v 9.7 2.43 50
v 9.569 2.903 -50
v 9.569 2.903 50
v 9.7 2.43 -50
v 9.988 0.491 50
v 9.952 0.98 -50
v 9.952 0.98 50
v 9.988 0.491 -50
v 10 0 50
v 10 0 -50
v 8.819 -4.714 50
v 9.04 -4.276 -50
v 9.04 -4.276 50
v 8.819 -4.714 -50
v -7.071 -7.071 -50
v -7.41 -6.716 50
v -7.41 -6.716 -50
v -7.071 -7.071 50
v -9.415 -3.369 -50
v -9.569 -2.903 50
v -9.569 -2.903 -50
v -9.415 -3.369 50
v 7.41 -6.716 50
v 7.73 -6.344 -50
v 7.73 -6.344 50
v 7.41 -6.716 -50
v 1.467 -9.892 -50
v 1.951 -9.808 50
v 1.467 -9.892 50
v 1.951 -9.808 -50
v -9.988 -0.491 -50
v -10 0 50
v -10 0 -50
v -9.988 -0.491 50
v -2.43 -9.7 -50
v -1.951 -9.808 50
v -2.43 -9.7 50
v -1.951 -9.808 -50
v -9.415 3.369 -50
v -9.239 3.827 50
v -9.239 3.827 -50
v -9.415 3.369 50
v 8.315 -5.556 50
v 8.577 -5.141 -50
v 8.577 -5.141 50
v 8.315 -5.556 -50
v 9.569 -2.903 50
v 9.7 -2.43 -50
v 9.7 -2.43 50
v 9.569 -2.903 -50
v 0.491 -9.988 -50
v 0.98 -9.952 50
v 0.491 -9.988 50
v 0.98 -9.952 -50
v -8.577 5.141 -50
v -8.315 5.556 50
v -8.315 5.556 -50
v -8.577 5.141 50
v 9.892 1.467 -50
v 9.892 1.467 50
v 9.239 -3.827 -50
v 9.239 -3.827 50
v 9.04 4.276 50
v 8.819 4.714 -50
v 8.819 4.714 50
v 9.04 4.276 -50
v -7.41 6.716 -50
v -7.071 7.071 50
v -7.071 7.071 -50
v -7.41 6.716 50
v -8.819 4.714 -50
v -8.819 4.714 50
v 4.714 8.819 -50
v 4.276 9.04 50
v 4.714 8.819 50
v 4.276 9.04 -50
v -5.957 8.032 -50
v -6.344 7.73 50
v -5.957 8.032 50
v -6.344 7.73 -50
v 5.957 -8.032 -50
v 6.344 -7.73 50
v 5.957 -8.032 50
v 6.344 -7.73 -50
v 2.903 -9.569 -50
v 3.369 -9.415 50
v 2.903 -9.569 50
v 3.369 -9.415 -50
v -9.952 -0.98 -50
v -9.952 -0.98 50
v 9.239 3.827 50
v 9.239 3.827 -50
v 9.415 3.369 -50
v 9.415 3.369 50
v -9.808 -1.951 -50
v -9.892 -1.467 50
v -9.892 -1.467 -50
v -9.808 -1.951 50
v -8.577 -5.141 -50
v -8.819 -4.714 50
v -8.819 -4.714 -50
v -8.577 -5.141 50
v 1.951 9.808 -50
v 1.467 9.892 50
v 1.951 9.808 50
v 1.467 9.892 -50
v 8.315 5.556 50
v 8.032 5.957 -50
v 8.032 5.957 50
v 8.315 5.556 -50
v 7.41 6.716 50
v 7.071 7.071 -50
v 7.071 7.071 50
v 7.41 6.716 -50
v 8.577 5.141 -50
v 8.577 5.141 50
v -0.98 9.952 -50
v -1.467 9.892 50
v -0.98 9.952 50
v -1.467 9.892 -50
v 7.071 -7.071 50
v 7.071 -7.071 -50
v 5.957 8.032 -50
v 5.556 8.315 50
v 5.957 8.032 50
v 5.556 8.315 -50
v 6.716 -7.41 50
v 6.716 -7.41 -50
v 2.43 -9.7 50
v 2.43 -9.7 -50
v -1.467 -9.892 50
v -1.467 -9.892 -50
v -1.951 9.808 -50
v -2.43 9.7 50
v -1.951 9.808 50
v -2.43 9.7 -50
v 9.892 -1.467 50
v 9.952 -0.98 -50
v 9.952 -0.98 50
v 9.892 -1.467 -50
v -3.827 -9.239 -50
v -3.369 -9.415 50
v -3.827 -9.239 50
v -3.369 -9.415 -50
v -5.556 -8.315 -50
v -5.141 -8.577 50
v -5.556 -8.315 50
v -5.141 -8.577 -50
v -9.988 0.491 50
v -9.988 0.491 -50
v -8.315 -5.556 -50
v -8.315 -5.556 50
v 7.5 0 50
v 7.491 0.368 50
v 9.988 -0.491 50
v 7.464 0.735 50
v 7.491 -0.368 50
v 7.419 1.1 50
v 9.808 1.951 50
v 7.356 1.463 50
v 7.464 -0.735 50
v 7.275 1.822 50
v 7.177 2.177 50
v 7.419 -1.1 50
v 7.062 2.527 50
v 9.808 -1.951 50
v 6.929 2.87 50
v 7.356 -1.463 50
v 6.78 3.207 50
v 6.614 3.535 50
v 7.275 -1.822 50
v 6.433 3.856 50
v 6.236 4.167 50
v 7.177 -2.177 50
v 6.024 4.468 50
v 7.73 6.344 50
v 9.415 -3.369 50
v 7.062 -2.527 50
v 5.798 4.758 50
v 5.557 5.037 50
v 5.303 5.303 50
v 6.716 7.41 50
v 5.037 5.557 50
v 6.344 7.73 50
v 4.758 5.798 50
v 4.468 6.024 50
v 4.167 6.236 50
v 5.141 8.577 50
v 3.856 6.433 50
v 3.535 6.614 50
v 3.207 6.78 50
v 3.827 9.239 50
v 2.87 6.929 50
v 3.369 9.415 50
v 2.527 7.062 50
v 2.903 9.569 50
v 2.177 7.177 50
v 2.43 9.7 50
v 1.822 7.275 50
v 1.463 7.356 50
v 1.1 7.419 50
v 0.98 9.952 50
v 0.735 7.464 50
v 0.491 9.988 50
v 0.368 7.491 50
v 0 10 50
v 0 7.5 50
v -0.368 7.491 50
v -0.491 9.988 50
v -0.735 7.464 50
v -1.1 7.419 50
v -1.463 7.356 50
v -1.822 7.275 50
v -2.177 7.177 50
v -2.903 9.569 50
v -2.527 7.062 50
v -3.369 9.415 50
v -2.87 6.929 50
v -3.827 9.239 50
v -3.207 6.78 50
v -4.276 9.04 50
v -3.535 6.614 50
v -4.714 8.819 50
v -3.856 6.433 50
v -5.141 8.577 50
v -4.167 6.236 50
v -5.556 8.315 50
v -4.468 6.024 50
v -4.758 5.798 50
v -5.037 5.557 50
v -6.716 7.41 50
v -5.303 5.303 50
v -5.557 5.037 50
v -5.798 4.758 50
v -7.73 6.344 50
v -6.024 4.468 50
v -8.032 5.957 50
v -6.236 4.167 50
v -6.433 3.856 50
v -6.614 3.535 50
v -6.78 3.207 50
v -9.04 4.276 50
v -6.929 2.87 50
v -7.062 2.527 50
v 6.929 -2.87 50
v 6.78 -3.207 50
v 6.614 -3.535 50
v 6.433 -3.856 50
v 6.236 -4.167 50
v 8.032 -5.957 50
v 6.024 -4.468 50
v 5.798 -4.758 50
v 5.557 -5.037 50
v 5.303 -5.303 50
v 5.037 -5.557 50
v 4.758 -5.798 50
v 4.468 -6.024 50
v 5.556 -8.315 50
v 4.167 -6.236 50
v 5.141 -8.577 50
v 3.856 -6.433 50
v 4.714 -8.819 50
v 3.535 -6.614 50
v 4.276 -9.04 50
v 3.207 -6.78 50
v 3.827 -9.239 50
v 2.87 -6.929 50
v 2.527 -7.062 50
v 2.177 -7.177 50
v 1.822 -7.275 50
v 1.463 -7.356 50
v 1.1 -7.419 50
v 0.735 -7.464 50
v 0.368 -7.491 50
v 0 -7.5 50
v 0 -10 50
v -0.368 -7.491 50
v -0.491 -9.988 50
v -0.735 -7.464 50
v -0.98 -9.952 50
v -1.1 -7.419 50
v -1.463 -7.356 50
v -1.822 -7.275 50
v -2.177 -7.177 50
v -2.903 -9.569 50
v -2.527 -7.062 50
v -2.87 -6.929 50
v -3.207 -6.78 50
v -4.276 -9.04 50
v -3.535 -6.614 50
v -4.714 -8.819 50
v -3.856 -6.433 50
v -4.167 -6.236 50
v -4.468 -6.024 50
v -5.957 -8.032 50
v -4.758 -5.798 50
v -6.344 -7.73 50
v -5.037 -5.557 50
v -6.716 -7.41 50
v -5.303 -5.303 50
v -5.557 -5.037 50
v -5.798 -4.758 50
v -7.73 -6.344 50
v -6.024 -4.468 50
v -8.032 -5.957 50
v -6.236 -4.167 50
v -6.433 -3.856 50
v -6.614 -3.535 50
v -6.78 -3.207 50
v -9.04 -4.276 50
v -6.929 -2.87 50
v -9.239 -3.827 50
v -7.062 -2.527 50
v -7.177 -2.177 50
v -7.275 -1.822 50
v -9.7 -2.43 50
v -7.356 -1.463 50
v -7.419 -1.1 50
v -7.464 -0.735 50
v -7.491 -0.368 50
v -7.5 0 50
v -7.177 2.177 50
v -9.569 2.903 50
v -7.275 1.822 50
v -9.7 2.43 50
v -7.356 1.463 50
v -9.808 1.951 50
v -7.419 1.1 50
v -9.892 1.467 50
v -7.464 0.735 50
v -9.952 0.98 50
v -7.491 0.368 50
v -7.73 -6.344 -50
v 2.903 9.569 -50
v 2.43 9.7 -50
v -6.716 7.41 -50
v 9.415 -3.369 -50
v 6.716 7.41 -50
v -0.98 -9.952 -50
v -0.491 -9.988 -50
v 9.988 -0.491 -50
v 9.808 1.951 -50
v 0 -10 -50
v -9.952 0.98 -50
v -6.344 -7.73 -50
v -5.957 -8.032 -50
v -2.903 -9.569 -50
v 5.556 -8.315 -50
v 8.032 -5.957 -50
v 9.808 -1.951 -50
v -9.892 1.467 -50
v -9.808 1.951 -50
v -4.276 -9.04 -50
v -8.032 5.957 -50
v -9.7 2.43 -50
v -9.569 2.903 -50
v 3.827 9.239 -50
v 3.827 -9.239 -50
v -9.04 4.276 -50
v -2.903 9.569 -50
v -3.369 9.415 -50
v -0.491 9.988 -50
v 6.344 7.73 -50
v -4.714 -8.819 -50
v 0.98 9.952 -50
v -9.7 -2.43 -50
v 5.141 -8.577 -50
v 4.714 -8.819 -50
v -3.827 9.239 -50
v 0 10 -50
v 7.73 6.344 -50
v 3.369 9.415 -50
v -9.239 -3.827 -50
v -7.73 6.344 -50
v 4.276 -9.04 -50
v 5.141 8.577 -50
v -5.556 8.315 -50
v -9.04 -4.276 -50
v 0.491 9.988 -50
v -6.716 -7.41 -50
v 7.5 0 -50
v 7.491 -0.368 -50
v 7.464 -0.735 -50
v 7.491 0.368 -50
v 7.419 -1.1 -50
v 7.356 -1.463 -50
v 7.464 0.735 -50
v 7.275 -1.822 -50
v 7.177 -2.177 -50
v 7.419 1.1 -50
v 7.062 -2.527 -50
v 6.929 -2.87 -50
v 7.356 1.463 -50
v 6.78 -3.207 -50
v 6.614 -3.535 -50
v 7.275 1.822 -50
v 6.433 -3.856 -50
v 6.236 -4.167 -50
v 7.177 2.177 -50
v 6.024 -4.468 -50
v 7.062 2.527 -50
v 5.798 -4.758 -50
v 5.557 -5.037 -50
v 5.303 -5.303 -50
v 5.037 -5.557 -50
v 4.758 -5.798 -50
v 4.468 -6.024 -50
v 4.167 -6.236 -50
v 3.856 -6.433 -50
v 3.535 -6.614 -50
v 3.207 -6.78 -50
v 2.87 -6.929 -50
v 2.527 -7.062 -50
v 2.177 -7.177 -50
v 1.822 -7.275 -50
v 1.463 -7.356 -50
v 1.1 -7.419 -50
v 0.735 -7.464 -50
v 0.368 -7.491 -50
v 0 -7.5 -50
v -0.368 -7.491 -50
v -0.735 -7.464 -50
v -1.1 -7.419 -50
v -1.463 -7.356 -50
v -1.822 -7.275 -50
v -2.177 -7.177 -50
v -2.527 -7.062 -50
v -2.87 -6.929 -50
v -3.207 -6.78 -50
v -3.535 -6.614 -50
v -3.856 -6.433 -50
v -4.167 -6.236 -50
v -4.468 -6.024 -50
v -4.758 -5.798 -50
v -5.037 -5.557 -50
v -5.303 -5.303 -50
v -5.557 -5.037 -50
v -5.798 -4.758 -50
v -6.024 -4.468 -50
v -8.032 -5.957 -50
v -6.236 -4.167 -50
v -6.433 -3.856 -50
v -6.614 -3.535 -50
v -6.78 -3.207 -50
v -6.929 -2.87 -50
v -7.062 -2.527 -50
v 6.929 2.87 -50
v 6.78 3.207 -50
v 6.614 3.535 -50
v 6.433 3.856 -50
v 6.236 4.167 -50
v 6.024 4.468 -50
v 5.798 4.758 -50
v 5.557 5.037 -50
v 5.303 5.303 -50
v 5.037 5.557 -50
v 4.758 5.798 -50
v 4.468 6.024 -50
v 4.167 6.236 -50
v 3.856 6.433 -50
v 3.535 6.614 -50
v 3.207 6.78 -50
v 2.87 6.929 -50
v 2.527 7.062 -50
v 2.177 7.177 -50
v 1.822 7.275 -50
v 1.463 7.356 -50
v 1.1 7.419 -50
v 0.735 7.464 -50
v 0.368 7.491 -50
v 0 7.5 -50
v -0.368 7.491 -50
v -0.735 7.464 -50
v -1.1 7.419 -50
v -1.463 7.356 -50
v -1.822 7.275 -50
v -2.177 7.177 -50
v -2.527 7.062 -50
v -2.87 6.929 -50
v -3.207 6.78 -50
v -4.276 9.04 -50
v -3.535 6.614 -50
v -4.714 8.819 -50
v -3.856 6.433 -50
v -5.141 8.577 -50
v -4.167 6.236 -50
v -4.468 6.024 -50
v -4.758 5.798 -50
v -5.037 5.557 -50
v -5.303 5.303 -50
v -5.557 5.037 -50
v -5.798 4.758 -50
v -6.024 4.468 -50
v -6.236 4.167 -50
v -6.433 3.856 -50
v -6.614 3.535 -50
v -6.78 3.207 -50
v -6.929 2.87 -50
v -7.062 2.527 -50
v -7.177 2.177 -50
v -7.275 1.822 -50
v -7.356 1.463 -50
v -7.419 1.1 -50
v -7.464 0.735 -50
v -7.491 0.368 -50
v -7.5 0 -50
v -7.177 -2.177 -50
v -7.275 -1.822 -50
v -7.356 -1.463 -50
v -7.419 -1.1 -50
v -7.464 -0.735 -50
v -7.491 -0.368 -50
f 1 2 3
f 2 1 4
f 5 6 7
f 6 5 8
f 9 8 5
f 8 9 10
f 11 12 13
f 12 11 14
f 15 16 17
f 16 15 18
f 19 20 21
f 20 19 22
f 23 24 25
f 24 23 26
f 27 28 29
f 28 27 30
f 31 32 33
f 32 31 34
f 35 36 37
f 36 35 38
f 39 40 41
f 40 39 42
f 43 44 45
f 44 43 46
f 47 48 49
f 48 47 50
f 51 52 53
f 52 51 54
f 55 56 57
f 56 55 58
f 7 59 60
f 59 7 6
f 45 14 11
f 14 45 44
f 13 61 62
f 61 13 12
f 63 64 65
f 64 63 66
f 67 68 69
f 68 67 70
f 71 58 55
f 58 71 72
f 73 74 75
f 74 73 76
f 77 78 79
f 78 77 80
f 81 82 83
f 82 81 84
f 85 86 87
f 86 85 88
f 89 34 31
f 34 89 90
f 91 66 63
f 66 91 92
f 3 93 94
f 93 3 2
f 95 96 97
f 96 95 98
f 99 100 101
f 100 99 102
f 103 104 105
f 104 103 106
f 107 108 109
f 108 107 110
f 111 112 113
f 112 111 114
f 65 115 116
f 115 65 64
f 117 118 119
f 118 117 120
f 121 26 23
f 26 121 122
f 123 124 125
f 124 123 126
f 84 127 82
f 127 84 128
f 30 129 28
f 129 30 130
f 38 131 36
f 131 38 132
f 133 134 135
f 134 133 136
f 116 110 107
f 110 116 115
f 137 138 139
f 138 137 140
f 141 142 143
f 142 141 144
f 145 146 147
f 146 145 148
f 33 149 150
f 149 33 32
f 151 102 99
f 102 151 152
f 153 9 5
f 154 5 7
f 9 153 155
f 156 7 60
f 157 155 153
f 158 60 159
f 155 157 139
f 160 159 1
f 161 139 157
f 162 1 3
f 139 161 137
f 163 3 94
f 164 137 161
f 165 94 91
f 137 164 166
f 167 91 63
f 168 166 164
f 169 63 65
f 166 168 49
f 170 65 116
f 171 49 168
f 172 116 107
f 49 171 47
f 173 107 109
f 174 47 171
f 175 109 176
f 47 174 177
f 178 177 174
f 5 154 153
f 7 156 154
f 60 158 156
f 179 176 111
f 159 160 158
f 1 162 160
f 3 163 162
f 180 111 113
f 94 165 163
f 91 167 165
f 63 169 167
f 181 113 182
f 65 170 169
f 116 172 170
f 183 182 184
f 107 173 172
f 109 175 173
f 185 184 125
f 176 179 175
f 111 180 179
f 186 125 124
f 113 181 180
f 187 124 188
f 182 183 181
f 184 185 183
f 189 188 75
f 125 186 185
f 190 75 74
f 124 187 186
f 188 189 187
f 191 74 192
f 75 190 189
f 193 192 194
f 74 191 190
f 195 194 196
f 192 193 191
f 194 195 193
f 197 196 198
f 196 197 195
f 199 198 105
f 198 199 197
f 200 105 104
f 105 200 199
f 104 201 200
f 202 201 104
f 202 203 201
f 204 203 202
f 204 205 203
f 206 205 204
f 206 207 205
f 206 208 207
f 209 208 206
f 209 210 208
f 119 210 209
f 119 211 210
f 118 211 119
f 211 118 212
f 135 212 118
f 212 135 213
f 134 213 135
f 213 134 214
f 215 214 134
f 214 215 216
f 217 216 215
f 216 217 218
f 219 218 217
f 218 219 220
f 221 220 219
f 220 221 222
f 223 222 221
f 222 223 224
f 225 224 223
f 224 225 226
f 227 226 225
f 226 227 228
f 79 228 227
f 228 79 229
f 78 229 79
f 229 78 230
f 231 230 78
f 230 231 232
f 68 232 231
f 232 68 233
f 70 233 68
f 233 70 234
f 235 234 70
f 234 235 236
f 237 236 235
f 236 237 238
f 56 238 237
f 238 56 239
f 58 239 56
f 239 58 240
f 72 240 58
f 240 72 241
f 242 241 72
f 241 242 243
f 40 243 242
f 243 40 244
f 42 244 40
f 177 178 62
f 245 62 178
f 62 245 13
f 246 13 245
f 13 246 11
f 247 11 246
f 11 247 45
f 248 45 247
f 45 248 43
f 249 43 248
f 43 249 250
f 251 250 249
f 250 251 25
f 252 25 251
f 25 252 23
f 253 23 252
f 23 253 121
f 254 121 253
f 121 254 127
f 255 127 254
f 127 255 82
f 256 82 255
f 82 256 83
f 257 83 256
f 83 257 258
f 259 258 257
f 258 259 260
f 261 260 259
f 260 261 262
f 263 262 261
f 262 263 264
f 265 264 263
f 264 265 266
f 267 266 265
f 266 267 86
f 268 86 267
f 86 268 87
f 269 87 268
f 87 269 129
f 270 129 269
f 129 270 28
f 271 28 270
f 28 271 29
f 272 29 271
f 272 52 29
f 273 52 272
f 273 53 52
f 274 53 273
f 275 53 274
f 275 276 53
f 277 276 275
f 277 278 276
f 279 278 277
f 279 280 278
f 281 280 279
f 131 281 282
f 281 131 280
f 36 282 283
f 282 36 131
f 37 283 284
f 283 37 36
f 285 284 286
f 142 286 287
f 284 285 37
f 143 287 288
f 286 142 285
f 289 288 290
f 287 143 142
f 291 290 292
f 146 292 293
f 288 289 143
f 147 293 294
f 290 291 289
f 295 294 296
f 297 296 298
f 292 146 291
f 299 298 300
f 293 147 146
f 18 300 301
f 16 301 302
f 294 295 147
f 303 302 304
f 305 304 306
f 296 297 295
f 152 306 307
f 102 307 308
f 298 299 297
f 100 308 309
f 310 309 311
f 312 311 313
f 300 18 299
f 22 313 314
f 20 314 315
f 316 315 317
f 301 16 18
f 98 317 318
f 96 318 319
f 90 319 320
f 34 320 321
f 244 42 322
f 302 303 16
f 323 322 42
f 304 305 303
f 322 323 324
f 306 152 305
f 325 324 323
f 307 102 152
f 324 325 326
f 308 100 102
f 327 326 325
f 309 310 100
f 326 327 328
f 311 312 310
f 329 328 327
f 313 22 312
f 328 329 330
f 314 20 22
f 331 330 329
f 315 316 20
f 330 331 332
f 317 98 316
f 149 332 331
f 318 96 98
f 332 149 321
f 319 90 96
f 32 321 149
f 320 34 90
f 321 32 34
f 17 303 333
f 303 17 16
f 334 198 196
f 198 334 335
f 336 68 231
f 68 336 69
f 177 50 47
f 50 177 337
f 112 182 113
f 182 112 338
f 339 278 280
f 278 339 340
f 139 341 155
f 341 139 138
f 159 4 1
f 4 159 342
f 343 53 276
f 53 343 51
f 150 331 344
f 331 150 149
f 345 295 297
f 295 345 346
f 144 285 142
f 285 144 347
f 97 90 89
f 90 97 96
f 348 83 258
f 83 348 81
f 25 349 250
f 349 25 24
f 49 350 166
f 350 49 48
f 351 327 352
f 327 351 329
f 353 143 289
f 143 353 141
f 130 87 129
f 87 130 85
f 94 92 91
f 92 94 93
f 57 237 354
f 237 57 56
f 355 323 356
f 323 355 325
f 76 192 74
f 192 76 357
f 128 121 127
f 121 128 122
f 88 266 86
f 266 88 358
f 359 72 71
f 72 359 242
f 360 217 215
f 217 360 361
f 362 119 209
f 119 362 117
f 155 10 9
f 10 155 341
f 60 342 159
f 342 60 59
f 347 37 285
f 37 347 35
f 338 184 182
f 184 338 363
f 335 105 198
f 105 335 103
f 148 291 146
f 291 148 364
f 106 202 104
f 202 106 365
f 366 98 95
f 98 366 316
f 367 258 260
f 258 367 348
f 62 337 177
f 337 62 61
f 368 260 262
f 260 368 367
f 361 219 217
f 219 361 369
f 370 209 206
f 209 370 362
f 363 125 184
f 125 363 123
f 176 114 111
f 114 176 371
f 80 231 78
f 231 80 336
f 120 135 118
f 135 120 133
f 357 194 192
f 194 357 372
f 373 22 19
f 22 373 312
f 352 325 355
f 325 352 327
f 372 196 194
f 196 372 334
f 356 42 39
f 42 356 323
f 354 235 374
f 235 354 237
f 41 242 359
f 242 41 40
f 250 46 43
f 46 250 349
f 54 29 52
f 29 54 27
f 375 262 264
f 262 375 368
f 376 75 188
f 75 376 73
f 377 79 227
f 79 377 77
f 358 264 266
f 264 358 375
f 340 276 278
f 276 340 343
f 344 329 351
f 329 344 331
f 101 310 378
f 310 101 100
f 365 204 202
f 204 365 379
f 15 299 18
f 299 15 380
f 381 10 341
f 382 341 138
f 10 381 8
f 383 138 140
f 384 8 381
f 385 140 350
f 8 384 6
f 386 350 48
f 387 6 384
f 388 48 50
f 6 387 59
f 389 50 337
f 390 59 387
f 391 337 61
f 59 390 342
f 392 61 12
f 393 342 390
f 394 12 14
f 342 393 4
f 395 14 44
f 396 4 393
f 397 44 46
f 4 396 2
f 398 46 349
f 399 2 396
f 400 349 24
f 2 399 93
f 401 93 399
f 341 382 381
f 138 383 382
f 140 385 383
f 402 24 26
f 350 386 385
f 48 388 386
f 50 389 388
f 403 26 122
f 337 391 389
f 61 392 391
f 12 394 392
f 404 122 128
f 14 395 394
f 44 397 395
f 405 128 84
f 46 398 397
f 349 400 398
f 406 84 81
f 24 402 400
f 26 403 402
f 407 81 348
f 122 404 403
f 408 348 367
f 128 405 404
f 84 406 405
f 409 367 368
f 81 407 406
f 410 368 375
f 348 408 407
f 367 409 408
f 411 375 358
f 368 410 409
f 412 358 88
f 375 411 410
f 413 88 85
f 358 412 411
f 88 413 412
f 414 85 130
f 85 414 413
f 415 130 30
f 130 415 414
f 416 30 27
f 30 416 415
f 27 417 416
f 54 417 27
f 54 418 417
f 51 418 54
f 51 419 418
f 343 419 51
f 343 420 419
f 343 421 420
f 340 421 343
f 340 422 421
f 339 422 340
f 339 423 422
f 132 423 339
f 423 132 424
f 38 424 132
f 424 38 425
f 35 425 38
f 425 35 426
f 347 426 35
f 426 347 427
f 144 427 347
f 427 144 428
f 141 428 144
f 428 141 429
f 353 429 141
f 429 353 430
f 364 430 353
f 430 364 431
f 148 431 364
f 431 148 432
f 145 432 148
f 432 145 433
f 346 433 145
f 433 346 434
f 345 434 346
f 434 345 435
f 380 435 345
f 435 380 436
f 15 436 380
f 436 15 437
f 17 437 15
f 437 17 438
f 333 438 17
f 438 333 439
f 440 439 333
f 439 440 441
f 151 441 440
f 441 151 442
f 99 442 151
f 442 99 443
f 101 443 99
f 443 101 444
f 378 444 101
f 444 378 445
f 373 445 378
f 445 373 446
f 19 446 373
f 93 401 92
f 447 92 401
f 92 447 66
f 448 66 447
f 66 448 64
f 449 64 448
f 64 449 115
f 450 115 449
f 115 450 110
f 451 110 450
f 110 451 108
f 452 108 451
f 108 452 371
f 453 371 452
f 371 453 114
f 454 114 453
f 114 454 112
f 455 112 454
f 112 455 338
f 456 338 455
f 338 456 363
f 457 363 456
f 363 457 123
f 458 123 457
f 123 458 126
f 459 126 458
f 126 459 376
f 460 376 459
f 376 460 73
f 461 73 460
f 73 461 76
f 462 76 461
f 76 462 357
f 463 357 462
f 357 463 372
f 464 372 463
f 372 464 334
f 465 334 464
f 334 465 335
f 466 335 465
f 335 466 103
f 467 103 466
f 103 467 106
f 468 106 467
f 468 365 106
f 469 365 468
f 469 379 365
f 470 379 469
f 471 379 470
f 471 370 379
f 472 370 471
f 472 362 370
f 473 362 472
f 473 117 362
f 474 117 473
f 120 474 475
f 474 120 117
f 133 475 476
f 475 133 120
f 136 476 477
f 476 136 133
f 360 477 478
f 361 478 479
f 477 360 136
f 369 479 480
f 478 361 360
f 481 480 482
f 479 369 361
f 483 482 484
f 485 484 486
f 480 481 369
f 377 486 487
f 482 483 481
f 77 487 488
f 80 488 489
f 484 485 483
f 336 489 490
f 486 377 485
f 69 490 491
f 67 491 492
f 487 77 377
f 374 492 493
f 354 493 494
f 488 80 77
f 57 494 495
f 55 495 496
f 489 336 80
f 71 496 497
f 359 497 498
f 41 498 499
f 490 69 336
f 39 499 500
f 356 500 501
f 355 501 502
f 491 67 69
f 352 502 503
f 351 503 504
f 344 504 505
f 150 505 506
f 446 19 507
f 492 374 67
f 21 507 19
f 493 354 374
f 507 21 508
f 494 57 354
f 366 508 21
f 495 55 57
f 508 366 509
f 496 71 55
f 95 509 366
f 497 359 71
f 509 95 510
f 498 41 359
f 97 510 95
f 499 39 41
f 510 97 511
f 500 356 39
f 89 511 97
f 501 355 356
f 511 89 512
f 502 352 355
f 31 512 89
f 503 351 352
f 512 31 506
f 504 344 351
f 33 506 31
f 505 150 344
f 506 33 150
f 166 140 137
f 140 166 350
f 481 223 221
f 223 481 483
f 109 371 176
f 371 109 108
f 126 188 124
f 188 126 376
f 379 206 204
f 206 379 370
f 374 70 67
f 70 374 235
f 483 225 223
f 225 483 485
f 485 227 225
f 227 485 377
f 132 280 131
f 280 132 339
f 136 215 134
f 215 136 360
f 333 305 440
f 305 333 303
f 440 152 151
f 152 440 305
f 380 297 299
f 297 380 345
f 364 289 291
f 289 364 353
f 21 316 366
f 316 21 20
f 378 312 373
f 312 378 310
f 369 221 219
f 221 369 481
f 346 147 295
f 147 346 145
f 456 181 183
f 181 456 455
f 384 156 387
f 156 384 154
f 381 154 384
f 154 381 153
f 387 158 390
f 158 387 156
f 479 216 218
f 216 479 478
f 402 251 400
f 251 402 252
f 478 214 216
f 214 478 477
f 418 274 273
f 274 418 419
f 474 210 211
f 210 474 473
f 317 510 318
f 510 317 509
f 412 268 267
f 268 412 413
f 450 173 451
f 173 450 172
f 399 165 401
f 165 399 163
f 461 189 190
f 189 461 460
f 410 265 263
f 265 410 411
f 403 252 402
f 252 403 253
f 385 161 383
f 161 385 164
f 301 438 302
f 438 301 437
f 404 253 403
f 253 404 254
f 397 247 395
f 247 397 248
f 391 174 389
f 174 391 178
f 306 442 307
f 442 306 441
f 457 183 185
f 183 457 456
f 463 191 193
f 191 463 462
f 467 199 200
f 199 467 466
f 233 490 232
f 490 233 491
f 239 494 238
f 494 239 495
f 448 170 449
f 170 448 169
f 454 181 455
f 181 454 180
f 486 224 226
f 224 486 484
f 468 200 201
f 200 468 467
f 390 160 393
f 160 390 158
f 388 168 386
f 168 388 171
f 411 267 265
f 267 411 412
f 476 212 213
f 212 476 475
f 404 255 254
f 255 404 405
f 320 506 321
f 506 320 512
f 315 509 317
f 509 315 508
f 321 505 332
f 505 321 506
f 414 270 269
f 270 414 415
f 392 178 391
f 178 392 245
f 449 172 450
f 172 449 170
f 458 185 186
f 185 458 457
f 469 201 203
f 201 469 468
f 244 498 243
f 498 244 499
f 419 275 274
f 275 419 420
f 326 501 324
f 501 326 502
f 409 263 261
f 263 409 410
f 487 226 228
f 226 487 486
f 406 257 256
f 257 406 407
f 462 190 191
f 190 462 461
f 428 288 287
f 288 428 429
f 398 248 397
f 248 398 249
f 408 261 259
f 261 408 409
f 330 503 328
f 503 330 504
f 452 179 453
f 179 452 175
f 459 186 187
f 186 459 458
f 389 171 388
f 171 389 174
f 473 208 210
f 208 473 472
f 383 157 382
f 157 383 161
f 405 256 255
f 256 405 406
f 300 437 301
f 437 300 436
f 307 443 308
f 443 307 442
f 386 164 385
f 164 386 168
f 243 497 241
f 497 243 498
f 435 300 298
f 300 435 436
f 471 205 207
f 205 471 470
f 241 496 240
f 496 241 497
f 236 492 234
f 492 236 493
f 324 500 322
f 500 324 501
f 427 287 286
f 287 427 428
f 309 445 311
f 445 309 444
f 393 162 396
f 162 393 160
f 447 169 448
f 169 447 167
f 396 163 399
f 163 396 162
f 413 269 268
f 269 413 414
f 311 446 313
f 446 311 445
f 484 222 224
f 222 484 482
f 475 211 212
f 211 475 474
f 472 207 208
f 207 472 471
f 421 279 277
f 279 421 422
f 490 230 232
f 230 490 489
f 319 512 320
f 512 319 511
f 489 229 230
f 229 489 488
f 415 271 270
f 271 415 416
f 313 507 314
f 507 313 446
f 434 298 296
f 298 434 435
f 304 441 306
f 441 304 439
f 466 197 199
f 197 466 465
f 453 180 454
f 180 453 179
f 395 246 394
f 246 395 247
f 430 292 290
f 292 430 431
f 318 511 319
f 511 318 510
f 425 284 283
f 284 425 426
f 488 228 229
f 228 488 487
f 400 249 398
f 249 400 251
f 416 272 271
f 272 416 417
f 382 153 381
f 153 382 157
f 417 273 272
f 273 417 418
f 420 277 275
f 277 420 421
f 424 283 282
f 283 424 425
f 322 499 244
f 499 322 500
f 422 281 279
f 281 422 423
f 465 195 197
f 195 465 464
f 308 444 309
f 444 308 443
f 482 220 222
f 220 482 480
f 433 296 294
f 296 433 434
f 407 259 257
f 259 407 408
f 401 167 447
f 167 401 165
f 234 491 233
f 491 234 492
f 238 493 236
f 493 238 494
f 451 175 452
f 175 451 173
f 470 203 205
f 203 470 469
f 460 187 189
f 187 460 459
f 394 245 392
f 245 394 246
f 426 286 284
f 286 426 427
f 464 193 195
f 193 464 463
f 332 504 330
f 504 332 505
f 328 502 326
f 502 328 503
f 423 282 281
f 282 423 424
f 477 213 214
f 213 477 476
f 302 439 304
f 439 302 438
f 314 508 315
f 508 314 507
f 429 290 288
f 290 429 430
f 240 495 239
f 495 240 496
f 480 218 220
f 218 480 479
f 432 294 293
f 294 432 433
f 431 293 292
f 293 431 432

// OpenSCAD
$fn = 128;

// Parameters for the PVC aquarium tubing
outer_diameter = 20; // Outer diameter of the tube
inner_diameter = 15; // Inner diameter of the tube
length = 100;        // Length of the tube
centered = true;     // Center the tube on the origin

// Robust overlap to avoid coplanar/degenerate subtraction issues
eps = 0.5;

module tubing(od, id, h, center=true) {
    // Ensure valid wall thickness
    id2 = min(id, od - 2*eps);

    difference() {
        cylinder(d=od, h=h, center=center);
        // Offset the inner cylinder slightly in Z so faces never coincide
        translate([0, 0, (center ? 0 : h/2) + eps])
            cylinder(d=id2, h=h + 2*eps, center=center);
    }
}

tubing(outer_diameter, inner_diameter, length, centered);
